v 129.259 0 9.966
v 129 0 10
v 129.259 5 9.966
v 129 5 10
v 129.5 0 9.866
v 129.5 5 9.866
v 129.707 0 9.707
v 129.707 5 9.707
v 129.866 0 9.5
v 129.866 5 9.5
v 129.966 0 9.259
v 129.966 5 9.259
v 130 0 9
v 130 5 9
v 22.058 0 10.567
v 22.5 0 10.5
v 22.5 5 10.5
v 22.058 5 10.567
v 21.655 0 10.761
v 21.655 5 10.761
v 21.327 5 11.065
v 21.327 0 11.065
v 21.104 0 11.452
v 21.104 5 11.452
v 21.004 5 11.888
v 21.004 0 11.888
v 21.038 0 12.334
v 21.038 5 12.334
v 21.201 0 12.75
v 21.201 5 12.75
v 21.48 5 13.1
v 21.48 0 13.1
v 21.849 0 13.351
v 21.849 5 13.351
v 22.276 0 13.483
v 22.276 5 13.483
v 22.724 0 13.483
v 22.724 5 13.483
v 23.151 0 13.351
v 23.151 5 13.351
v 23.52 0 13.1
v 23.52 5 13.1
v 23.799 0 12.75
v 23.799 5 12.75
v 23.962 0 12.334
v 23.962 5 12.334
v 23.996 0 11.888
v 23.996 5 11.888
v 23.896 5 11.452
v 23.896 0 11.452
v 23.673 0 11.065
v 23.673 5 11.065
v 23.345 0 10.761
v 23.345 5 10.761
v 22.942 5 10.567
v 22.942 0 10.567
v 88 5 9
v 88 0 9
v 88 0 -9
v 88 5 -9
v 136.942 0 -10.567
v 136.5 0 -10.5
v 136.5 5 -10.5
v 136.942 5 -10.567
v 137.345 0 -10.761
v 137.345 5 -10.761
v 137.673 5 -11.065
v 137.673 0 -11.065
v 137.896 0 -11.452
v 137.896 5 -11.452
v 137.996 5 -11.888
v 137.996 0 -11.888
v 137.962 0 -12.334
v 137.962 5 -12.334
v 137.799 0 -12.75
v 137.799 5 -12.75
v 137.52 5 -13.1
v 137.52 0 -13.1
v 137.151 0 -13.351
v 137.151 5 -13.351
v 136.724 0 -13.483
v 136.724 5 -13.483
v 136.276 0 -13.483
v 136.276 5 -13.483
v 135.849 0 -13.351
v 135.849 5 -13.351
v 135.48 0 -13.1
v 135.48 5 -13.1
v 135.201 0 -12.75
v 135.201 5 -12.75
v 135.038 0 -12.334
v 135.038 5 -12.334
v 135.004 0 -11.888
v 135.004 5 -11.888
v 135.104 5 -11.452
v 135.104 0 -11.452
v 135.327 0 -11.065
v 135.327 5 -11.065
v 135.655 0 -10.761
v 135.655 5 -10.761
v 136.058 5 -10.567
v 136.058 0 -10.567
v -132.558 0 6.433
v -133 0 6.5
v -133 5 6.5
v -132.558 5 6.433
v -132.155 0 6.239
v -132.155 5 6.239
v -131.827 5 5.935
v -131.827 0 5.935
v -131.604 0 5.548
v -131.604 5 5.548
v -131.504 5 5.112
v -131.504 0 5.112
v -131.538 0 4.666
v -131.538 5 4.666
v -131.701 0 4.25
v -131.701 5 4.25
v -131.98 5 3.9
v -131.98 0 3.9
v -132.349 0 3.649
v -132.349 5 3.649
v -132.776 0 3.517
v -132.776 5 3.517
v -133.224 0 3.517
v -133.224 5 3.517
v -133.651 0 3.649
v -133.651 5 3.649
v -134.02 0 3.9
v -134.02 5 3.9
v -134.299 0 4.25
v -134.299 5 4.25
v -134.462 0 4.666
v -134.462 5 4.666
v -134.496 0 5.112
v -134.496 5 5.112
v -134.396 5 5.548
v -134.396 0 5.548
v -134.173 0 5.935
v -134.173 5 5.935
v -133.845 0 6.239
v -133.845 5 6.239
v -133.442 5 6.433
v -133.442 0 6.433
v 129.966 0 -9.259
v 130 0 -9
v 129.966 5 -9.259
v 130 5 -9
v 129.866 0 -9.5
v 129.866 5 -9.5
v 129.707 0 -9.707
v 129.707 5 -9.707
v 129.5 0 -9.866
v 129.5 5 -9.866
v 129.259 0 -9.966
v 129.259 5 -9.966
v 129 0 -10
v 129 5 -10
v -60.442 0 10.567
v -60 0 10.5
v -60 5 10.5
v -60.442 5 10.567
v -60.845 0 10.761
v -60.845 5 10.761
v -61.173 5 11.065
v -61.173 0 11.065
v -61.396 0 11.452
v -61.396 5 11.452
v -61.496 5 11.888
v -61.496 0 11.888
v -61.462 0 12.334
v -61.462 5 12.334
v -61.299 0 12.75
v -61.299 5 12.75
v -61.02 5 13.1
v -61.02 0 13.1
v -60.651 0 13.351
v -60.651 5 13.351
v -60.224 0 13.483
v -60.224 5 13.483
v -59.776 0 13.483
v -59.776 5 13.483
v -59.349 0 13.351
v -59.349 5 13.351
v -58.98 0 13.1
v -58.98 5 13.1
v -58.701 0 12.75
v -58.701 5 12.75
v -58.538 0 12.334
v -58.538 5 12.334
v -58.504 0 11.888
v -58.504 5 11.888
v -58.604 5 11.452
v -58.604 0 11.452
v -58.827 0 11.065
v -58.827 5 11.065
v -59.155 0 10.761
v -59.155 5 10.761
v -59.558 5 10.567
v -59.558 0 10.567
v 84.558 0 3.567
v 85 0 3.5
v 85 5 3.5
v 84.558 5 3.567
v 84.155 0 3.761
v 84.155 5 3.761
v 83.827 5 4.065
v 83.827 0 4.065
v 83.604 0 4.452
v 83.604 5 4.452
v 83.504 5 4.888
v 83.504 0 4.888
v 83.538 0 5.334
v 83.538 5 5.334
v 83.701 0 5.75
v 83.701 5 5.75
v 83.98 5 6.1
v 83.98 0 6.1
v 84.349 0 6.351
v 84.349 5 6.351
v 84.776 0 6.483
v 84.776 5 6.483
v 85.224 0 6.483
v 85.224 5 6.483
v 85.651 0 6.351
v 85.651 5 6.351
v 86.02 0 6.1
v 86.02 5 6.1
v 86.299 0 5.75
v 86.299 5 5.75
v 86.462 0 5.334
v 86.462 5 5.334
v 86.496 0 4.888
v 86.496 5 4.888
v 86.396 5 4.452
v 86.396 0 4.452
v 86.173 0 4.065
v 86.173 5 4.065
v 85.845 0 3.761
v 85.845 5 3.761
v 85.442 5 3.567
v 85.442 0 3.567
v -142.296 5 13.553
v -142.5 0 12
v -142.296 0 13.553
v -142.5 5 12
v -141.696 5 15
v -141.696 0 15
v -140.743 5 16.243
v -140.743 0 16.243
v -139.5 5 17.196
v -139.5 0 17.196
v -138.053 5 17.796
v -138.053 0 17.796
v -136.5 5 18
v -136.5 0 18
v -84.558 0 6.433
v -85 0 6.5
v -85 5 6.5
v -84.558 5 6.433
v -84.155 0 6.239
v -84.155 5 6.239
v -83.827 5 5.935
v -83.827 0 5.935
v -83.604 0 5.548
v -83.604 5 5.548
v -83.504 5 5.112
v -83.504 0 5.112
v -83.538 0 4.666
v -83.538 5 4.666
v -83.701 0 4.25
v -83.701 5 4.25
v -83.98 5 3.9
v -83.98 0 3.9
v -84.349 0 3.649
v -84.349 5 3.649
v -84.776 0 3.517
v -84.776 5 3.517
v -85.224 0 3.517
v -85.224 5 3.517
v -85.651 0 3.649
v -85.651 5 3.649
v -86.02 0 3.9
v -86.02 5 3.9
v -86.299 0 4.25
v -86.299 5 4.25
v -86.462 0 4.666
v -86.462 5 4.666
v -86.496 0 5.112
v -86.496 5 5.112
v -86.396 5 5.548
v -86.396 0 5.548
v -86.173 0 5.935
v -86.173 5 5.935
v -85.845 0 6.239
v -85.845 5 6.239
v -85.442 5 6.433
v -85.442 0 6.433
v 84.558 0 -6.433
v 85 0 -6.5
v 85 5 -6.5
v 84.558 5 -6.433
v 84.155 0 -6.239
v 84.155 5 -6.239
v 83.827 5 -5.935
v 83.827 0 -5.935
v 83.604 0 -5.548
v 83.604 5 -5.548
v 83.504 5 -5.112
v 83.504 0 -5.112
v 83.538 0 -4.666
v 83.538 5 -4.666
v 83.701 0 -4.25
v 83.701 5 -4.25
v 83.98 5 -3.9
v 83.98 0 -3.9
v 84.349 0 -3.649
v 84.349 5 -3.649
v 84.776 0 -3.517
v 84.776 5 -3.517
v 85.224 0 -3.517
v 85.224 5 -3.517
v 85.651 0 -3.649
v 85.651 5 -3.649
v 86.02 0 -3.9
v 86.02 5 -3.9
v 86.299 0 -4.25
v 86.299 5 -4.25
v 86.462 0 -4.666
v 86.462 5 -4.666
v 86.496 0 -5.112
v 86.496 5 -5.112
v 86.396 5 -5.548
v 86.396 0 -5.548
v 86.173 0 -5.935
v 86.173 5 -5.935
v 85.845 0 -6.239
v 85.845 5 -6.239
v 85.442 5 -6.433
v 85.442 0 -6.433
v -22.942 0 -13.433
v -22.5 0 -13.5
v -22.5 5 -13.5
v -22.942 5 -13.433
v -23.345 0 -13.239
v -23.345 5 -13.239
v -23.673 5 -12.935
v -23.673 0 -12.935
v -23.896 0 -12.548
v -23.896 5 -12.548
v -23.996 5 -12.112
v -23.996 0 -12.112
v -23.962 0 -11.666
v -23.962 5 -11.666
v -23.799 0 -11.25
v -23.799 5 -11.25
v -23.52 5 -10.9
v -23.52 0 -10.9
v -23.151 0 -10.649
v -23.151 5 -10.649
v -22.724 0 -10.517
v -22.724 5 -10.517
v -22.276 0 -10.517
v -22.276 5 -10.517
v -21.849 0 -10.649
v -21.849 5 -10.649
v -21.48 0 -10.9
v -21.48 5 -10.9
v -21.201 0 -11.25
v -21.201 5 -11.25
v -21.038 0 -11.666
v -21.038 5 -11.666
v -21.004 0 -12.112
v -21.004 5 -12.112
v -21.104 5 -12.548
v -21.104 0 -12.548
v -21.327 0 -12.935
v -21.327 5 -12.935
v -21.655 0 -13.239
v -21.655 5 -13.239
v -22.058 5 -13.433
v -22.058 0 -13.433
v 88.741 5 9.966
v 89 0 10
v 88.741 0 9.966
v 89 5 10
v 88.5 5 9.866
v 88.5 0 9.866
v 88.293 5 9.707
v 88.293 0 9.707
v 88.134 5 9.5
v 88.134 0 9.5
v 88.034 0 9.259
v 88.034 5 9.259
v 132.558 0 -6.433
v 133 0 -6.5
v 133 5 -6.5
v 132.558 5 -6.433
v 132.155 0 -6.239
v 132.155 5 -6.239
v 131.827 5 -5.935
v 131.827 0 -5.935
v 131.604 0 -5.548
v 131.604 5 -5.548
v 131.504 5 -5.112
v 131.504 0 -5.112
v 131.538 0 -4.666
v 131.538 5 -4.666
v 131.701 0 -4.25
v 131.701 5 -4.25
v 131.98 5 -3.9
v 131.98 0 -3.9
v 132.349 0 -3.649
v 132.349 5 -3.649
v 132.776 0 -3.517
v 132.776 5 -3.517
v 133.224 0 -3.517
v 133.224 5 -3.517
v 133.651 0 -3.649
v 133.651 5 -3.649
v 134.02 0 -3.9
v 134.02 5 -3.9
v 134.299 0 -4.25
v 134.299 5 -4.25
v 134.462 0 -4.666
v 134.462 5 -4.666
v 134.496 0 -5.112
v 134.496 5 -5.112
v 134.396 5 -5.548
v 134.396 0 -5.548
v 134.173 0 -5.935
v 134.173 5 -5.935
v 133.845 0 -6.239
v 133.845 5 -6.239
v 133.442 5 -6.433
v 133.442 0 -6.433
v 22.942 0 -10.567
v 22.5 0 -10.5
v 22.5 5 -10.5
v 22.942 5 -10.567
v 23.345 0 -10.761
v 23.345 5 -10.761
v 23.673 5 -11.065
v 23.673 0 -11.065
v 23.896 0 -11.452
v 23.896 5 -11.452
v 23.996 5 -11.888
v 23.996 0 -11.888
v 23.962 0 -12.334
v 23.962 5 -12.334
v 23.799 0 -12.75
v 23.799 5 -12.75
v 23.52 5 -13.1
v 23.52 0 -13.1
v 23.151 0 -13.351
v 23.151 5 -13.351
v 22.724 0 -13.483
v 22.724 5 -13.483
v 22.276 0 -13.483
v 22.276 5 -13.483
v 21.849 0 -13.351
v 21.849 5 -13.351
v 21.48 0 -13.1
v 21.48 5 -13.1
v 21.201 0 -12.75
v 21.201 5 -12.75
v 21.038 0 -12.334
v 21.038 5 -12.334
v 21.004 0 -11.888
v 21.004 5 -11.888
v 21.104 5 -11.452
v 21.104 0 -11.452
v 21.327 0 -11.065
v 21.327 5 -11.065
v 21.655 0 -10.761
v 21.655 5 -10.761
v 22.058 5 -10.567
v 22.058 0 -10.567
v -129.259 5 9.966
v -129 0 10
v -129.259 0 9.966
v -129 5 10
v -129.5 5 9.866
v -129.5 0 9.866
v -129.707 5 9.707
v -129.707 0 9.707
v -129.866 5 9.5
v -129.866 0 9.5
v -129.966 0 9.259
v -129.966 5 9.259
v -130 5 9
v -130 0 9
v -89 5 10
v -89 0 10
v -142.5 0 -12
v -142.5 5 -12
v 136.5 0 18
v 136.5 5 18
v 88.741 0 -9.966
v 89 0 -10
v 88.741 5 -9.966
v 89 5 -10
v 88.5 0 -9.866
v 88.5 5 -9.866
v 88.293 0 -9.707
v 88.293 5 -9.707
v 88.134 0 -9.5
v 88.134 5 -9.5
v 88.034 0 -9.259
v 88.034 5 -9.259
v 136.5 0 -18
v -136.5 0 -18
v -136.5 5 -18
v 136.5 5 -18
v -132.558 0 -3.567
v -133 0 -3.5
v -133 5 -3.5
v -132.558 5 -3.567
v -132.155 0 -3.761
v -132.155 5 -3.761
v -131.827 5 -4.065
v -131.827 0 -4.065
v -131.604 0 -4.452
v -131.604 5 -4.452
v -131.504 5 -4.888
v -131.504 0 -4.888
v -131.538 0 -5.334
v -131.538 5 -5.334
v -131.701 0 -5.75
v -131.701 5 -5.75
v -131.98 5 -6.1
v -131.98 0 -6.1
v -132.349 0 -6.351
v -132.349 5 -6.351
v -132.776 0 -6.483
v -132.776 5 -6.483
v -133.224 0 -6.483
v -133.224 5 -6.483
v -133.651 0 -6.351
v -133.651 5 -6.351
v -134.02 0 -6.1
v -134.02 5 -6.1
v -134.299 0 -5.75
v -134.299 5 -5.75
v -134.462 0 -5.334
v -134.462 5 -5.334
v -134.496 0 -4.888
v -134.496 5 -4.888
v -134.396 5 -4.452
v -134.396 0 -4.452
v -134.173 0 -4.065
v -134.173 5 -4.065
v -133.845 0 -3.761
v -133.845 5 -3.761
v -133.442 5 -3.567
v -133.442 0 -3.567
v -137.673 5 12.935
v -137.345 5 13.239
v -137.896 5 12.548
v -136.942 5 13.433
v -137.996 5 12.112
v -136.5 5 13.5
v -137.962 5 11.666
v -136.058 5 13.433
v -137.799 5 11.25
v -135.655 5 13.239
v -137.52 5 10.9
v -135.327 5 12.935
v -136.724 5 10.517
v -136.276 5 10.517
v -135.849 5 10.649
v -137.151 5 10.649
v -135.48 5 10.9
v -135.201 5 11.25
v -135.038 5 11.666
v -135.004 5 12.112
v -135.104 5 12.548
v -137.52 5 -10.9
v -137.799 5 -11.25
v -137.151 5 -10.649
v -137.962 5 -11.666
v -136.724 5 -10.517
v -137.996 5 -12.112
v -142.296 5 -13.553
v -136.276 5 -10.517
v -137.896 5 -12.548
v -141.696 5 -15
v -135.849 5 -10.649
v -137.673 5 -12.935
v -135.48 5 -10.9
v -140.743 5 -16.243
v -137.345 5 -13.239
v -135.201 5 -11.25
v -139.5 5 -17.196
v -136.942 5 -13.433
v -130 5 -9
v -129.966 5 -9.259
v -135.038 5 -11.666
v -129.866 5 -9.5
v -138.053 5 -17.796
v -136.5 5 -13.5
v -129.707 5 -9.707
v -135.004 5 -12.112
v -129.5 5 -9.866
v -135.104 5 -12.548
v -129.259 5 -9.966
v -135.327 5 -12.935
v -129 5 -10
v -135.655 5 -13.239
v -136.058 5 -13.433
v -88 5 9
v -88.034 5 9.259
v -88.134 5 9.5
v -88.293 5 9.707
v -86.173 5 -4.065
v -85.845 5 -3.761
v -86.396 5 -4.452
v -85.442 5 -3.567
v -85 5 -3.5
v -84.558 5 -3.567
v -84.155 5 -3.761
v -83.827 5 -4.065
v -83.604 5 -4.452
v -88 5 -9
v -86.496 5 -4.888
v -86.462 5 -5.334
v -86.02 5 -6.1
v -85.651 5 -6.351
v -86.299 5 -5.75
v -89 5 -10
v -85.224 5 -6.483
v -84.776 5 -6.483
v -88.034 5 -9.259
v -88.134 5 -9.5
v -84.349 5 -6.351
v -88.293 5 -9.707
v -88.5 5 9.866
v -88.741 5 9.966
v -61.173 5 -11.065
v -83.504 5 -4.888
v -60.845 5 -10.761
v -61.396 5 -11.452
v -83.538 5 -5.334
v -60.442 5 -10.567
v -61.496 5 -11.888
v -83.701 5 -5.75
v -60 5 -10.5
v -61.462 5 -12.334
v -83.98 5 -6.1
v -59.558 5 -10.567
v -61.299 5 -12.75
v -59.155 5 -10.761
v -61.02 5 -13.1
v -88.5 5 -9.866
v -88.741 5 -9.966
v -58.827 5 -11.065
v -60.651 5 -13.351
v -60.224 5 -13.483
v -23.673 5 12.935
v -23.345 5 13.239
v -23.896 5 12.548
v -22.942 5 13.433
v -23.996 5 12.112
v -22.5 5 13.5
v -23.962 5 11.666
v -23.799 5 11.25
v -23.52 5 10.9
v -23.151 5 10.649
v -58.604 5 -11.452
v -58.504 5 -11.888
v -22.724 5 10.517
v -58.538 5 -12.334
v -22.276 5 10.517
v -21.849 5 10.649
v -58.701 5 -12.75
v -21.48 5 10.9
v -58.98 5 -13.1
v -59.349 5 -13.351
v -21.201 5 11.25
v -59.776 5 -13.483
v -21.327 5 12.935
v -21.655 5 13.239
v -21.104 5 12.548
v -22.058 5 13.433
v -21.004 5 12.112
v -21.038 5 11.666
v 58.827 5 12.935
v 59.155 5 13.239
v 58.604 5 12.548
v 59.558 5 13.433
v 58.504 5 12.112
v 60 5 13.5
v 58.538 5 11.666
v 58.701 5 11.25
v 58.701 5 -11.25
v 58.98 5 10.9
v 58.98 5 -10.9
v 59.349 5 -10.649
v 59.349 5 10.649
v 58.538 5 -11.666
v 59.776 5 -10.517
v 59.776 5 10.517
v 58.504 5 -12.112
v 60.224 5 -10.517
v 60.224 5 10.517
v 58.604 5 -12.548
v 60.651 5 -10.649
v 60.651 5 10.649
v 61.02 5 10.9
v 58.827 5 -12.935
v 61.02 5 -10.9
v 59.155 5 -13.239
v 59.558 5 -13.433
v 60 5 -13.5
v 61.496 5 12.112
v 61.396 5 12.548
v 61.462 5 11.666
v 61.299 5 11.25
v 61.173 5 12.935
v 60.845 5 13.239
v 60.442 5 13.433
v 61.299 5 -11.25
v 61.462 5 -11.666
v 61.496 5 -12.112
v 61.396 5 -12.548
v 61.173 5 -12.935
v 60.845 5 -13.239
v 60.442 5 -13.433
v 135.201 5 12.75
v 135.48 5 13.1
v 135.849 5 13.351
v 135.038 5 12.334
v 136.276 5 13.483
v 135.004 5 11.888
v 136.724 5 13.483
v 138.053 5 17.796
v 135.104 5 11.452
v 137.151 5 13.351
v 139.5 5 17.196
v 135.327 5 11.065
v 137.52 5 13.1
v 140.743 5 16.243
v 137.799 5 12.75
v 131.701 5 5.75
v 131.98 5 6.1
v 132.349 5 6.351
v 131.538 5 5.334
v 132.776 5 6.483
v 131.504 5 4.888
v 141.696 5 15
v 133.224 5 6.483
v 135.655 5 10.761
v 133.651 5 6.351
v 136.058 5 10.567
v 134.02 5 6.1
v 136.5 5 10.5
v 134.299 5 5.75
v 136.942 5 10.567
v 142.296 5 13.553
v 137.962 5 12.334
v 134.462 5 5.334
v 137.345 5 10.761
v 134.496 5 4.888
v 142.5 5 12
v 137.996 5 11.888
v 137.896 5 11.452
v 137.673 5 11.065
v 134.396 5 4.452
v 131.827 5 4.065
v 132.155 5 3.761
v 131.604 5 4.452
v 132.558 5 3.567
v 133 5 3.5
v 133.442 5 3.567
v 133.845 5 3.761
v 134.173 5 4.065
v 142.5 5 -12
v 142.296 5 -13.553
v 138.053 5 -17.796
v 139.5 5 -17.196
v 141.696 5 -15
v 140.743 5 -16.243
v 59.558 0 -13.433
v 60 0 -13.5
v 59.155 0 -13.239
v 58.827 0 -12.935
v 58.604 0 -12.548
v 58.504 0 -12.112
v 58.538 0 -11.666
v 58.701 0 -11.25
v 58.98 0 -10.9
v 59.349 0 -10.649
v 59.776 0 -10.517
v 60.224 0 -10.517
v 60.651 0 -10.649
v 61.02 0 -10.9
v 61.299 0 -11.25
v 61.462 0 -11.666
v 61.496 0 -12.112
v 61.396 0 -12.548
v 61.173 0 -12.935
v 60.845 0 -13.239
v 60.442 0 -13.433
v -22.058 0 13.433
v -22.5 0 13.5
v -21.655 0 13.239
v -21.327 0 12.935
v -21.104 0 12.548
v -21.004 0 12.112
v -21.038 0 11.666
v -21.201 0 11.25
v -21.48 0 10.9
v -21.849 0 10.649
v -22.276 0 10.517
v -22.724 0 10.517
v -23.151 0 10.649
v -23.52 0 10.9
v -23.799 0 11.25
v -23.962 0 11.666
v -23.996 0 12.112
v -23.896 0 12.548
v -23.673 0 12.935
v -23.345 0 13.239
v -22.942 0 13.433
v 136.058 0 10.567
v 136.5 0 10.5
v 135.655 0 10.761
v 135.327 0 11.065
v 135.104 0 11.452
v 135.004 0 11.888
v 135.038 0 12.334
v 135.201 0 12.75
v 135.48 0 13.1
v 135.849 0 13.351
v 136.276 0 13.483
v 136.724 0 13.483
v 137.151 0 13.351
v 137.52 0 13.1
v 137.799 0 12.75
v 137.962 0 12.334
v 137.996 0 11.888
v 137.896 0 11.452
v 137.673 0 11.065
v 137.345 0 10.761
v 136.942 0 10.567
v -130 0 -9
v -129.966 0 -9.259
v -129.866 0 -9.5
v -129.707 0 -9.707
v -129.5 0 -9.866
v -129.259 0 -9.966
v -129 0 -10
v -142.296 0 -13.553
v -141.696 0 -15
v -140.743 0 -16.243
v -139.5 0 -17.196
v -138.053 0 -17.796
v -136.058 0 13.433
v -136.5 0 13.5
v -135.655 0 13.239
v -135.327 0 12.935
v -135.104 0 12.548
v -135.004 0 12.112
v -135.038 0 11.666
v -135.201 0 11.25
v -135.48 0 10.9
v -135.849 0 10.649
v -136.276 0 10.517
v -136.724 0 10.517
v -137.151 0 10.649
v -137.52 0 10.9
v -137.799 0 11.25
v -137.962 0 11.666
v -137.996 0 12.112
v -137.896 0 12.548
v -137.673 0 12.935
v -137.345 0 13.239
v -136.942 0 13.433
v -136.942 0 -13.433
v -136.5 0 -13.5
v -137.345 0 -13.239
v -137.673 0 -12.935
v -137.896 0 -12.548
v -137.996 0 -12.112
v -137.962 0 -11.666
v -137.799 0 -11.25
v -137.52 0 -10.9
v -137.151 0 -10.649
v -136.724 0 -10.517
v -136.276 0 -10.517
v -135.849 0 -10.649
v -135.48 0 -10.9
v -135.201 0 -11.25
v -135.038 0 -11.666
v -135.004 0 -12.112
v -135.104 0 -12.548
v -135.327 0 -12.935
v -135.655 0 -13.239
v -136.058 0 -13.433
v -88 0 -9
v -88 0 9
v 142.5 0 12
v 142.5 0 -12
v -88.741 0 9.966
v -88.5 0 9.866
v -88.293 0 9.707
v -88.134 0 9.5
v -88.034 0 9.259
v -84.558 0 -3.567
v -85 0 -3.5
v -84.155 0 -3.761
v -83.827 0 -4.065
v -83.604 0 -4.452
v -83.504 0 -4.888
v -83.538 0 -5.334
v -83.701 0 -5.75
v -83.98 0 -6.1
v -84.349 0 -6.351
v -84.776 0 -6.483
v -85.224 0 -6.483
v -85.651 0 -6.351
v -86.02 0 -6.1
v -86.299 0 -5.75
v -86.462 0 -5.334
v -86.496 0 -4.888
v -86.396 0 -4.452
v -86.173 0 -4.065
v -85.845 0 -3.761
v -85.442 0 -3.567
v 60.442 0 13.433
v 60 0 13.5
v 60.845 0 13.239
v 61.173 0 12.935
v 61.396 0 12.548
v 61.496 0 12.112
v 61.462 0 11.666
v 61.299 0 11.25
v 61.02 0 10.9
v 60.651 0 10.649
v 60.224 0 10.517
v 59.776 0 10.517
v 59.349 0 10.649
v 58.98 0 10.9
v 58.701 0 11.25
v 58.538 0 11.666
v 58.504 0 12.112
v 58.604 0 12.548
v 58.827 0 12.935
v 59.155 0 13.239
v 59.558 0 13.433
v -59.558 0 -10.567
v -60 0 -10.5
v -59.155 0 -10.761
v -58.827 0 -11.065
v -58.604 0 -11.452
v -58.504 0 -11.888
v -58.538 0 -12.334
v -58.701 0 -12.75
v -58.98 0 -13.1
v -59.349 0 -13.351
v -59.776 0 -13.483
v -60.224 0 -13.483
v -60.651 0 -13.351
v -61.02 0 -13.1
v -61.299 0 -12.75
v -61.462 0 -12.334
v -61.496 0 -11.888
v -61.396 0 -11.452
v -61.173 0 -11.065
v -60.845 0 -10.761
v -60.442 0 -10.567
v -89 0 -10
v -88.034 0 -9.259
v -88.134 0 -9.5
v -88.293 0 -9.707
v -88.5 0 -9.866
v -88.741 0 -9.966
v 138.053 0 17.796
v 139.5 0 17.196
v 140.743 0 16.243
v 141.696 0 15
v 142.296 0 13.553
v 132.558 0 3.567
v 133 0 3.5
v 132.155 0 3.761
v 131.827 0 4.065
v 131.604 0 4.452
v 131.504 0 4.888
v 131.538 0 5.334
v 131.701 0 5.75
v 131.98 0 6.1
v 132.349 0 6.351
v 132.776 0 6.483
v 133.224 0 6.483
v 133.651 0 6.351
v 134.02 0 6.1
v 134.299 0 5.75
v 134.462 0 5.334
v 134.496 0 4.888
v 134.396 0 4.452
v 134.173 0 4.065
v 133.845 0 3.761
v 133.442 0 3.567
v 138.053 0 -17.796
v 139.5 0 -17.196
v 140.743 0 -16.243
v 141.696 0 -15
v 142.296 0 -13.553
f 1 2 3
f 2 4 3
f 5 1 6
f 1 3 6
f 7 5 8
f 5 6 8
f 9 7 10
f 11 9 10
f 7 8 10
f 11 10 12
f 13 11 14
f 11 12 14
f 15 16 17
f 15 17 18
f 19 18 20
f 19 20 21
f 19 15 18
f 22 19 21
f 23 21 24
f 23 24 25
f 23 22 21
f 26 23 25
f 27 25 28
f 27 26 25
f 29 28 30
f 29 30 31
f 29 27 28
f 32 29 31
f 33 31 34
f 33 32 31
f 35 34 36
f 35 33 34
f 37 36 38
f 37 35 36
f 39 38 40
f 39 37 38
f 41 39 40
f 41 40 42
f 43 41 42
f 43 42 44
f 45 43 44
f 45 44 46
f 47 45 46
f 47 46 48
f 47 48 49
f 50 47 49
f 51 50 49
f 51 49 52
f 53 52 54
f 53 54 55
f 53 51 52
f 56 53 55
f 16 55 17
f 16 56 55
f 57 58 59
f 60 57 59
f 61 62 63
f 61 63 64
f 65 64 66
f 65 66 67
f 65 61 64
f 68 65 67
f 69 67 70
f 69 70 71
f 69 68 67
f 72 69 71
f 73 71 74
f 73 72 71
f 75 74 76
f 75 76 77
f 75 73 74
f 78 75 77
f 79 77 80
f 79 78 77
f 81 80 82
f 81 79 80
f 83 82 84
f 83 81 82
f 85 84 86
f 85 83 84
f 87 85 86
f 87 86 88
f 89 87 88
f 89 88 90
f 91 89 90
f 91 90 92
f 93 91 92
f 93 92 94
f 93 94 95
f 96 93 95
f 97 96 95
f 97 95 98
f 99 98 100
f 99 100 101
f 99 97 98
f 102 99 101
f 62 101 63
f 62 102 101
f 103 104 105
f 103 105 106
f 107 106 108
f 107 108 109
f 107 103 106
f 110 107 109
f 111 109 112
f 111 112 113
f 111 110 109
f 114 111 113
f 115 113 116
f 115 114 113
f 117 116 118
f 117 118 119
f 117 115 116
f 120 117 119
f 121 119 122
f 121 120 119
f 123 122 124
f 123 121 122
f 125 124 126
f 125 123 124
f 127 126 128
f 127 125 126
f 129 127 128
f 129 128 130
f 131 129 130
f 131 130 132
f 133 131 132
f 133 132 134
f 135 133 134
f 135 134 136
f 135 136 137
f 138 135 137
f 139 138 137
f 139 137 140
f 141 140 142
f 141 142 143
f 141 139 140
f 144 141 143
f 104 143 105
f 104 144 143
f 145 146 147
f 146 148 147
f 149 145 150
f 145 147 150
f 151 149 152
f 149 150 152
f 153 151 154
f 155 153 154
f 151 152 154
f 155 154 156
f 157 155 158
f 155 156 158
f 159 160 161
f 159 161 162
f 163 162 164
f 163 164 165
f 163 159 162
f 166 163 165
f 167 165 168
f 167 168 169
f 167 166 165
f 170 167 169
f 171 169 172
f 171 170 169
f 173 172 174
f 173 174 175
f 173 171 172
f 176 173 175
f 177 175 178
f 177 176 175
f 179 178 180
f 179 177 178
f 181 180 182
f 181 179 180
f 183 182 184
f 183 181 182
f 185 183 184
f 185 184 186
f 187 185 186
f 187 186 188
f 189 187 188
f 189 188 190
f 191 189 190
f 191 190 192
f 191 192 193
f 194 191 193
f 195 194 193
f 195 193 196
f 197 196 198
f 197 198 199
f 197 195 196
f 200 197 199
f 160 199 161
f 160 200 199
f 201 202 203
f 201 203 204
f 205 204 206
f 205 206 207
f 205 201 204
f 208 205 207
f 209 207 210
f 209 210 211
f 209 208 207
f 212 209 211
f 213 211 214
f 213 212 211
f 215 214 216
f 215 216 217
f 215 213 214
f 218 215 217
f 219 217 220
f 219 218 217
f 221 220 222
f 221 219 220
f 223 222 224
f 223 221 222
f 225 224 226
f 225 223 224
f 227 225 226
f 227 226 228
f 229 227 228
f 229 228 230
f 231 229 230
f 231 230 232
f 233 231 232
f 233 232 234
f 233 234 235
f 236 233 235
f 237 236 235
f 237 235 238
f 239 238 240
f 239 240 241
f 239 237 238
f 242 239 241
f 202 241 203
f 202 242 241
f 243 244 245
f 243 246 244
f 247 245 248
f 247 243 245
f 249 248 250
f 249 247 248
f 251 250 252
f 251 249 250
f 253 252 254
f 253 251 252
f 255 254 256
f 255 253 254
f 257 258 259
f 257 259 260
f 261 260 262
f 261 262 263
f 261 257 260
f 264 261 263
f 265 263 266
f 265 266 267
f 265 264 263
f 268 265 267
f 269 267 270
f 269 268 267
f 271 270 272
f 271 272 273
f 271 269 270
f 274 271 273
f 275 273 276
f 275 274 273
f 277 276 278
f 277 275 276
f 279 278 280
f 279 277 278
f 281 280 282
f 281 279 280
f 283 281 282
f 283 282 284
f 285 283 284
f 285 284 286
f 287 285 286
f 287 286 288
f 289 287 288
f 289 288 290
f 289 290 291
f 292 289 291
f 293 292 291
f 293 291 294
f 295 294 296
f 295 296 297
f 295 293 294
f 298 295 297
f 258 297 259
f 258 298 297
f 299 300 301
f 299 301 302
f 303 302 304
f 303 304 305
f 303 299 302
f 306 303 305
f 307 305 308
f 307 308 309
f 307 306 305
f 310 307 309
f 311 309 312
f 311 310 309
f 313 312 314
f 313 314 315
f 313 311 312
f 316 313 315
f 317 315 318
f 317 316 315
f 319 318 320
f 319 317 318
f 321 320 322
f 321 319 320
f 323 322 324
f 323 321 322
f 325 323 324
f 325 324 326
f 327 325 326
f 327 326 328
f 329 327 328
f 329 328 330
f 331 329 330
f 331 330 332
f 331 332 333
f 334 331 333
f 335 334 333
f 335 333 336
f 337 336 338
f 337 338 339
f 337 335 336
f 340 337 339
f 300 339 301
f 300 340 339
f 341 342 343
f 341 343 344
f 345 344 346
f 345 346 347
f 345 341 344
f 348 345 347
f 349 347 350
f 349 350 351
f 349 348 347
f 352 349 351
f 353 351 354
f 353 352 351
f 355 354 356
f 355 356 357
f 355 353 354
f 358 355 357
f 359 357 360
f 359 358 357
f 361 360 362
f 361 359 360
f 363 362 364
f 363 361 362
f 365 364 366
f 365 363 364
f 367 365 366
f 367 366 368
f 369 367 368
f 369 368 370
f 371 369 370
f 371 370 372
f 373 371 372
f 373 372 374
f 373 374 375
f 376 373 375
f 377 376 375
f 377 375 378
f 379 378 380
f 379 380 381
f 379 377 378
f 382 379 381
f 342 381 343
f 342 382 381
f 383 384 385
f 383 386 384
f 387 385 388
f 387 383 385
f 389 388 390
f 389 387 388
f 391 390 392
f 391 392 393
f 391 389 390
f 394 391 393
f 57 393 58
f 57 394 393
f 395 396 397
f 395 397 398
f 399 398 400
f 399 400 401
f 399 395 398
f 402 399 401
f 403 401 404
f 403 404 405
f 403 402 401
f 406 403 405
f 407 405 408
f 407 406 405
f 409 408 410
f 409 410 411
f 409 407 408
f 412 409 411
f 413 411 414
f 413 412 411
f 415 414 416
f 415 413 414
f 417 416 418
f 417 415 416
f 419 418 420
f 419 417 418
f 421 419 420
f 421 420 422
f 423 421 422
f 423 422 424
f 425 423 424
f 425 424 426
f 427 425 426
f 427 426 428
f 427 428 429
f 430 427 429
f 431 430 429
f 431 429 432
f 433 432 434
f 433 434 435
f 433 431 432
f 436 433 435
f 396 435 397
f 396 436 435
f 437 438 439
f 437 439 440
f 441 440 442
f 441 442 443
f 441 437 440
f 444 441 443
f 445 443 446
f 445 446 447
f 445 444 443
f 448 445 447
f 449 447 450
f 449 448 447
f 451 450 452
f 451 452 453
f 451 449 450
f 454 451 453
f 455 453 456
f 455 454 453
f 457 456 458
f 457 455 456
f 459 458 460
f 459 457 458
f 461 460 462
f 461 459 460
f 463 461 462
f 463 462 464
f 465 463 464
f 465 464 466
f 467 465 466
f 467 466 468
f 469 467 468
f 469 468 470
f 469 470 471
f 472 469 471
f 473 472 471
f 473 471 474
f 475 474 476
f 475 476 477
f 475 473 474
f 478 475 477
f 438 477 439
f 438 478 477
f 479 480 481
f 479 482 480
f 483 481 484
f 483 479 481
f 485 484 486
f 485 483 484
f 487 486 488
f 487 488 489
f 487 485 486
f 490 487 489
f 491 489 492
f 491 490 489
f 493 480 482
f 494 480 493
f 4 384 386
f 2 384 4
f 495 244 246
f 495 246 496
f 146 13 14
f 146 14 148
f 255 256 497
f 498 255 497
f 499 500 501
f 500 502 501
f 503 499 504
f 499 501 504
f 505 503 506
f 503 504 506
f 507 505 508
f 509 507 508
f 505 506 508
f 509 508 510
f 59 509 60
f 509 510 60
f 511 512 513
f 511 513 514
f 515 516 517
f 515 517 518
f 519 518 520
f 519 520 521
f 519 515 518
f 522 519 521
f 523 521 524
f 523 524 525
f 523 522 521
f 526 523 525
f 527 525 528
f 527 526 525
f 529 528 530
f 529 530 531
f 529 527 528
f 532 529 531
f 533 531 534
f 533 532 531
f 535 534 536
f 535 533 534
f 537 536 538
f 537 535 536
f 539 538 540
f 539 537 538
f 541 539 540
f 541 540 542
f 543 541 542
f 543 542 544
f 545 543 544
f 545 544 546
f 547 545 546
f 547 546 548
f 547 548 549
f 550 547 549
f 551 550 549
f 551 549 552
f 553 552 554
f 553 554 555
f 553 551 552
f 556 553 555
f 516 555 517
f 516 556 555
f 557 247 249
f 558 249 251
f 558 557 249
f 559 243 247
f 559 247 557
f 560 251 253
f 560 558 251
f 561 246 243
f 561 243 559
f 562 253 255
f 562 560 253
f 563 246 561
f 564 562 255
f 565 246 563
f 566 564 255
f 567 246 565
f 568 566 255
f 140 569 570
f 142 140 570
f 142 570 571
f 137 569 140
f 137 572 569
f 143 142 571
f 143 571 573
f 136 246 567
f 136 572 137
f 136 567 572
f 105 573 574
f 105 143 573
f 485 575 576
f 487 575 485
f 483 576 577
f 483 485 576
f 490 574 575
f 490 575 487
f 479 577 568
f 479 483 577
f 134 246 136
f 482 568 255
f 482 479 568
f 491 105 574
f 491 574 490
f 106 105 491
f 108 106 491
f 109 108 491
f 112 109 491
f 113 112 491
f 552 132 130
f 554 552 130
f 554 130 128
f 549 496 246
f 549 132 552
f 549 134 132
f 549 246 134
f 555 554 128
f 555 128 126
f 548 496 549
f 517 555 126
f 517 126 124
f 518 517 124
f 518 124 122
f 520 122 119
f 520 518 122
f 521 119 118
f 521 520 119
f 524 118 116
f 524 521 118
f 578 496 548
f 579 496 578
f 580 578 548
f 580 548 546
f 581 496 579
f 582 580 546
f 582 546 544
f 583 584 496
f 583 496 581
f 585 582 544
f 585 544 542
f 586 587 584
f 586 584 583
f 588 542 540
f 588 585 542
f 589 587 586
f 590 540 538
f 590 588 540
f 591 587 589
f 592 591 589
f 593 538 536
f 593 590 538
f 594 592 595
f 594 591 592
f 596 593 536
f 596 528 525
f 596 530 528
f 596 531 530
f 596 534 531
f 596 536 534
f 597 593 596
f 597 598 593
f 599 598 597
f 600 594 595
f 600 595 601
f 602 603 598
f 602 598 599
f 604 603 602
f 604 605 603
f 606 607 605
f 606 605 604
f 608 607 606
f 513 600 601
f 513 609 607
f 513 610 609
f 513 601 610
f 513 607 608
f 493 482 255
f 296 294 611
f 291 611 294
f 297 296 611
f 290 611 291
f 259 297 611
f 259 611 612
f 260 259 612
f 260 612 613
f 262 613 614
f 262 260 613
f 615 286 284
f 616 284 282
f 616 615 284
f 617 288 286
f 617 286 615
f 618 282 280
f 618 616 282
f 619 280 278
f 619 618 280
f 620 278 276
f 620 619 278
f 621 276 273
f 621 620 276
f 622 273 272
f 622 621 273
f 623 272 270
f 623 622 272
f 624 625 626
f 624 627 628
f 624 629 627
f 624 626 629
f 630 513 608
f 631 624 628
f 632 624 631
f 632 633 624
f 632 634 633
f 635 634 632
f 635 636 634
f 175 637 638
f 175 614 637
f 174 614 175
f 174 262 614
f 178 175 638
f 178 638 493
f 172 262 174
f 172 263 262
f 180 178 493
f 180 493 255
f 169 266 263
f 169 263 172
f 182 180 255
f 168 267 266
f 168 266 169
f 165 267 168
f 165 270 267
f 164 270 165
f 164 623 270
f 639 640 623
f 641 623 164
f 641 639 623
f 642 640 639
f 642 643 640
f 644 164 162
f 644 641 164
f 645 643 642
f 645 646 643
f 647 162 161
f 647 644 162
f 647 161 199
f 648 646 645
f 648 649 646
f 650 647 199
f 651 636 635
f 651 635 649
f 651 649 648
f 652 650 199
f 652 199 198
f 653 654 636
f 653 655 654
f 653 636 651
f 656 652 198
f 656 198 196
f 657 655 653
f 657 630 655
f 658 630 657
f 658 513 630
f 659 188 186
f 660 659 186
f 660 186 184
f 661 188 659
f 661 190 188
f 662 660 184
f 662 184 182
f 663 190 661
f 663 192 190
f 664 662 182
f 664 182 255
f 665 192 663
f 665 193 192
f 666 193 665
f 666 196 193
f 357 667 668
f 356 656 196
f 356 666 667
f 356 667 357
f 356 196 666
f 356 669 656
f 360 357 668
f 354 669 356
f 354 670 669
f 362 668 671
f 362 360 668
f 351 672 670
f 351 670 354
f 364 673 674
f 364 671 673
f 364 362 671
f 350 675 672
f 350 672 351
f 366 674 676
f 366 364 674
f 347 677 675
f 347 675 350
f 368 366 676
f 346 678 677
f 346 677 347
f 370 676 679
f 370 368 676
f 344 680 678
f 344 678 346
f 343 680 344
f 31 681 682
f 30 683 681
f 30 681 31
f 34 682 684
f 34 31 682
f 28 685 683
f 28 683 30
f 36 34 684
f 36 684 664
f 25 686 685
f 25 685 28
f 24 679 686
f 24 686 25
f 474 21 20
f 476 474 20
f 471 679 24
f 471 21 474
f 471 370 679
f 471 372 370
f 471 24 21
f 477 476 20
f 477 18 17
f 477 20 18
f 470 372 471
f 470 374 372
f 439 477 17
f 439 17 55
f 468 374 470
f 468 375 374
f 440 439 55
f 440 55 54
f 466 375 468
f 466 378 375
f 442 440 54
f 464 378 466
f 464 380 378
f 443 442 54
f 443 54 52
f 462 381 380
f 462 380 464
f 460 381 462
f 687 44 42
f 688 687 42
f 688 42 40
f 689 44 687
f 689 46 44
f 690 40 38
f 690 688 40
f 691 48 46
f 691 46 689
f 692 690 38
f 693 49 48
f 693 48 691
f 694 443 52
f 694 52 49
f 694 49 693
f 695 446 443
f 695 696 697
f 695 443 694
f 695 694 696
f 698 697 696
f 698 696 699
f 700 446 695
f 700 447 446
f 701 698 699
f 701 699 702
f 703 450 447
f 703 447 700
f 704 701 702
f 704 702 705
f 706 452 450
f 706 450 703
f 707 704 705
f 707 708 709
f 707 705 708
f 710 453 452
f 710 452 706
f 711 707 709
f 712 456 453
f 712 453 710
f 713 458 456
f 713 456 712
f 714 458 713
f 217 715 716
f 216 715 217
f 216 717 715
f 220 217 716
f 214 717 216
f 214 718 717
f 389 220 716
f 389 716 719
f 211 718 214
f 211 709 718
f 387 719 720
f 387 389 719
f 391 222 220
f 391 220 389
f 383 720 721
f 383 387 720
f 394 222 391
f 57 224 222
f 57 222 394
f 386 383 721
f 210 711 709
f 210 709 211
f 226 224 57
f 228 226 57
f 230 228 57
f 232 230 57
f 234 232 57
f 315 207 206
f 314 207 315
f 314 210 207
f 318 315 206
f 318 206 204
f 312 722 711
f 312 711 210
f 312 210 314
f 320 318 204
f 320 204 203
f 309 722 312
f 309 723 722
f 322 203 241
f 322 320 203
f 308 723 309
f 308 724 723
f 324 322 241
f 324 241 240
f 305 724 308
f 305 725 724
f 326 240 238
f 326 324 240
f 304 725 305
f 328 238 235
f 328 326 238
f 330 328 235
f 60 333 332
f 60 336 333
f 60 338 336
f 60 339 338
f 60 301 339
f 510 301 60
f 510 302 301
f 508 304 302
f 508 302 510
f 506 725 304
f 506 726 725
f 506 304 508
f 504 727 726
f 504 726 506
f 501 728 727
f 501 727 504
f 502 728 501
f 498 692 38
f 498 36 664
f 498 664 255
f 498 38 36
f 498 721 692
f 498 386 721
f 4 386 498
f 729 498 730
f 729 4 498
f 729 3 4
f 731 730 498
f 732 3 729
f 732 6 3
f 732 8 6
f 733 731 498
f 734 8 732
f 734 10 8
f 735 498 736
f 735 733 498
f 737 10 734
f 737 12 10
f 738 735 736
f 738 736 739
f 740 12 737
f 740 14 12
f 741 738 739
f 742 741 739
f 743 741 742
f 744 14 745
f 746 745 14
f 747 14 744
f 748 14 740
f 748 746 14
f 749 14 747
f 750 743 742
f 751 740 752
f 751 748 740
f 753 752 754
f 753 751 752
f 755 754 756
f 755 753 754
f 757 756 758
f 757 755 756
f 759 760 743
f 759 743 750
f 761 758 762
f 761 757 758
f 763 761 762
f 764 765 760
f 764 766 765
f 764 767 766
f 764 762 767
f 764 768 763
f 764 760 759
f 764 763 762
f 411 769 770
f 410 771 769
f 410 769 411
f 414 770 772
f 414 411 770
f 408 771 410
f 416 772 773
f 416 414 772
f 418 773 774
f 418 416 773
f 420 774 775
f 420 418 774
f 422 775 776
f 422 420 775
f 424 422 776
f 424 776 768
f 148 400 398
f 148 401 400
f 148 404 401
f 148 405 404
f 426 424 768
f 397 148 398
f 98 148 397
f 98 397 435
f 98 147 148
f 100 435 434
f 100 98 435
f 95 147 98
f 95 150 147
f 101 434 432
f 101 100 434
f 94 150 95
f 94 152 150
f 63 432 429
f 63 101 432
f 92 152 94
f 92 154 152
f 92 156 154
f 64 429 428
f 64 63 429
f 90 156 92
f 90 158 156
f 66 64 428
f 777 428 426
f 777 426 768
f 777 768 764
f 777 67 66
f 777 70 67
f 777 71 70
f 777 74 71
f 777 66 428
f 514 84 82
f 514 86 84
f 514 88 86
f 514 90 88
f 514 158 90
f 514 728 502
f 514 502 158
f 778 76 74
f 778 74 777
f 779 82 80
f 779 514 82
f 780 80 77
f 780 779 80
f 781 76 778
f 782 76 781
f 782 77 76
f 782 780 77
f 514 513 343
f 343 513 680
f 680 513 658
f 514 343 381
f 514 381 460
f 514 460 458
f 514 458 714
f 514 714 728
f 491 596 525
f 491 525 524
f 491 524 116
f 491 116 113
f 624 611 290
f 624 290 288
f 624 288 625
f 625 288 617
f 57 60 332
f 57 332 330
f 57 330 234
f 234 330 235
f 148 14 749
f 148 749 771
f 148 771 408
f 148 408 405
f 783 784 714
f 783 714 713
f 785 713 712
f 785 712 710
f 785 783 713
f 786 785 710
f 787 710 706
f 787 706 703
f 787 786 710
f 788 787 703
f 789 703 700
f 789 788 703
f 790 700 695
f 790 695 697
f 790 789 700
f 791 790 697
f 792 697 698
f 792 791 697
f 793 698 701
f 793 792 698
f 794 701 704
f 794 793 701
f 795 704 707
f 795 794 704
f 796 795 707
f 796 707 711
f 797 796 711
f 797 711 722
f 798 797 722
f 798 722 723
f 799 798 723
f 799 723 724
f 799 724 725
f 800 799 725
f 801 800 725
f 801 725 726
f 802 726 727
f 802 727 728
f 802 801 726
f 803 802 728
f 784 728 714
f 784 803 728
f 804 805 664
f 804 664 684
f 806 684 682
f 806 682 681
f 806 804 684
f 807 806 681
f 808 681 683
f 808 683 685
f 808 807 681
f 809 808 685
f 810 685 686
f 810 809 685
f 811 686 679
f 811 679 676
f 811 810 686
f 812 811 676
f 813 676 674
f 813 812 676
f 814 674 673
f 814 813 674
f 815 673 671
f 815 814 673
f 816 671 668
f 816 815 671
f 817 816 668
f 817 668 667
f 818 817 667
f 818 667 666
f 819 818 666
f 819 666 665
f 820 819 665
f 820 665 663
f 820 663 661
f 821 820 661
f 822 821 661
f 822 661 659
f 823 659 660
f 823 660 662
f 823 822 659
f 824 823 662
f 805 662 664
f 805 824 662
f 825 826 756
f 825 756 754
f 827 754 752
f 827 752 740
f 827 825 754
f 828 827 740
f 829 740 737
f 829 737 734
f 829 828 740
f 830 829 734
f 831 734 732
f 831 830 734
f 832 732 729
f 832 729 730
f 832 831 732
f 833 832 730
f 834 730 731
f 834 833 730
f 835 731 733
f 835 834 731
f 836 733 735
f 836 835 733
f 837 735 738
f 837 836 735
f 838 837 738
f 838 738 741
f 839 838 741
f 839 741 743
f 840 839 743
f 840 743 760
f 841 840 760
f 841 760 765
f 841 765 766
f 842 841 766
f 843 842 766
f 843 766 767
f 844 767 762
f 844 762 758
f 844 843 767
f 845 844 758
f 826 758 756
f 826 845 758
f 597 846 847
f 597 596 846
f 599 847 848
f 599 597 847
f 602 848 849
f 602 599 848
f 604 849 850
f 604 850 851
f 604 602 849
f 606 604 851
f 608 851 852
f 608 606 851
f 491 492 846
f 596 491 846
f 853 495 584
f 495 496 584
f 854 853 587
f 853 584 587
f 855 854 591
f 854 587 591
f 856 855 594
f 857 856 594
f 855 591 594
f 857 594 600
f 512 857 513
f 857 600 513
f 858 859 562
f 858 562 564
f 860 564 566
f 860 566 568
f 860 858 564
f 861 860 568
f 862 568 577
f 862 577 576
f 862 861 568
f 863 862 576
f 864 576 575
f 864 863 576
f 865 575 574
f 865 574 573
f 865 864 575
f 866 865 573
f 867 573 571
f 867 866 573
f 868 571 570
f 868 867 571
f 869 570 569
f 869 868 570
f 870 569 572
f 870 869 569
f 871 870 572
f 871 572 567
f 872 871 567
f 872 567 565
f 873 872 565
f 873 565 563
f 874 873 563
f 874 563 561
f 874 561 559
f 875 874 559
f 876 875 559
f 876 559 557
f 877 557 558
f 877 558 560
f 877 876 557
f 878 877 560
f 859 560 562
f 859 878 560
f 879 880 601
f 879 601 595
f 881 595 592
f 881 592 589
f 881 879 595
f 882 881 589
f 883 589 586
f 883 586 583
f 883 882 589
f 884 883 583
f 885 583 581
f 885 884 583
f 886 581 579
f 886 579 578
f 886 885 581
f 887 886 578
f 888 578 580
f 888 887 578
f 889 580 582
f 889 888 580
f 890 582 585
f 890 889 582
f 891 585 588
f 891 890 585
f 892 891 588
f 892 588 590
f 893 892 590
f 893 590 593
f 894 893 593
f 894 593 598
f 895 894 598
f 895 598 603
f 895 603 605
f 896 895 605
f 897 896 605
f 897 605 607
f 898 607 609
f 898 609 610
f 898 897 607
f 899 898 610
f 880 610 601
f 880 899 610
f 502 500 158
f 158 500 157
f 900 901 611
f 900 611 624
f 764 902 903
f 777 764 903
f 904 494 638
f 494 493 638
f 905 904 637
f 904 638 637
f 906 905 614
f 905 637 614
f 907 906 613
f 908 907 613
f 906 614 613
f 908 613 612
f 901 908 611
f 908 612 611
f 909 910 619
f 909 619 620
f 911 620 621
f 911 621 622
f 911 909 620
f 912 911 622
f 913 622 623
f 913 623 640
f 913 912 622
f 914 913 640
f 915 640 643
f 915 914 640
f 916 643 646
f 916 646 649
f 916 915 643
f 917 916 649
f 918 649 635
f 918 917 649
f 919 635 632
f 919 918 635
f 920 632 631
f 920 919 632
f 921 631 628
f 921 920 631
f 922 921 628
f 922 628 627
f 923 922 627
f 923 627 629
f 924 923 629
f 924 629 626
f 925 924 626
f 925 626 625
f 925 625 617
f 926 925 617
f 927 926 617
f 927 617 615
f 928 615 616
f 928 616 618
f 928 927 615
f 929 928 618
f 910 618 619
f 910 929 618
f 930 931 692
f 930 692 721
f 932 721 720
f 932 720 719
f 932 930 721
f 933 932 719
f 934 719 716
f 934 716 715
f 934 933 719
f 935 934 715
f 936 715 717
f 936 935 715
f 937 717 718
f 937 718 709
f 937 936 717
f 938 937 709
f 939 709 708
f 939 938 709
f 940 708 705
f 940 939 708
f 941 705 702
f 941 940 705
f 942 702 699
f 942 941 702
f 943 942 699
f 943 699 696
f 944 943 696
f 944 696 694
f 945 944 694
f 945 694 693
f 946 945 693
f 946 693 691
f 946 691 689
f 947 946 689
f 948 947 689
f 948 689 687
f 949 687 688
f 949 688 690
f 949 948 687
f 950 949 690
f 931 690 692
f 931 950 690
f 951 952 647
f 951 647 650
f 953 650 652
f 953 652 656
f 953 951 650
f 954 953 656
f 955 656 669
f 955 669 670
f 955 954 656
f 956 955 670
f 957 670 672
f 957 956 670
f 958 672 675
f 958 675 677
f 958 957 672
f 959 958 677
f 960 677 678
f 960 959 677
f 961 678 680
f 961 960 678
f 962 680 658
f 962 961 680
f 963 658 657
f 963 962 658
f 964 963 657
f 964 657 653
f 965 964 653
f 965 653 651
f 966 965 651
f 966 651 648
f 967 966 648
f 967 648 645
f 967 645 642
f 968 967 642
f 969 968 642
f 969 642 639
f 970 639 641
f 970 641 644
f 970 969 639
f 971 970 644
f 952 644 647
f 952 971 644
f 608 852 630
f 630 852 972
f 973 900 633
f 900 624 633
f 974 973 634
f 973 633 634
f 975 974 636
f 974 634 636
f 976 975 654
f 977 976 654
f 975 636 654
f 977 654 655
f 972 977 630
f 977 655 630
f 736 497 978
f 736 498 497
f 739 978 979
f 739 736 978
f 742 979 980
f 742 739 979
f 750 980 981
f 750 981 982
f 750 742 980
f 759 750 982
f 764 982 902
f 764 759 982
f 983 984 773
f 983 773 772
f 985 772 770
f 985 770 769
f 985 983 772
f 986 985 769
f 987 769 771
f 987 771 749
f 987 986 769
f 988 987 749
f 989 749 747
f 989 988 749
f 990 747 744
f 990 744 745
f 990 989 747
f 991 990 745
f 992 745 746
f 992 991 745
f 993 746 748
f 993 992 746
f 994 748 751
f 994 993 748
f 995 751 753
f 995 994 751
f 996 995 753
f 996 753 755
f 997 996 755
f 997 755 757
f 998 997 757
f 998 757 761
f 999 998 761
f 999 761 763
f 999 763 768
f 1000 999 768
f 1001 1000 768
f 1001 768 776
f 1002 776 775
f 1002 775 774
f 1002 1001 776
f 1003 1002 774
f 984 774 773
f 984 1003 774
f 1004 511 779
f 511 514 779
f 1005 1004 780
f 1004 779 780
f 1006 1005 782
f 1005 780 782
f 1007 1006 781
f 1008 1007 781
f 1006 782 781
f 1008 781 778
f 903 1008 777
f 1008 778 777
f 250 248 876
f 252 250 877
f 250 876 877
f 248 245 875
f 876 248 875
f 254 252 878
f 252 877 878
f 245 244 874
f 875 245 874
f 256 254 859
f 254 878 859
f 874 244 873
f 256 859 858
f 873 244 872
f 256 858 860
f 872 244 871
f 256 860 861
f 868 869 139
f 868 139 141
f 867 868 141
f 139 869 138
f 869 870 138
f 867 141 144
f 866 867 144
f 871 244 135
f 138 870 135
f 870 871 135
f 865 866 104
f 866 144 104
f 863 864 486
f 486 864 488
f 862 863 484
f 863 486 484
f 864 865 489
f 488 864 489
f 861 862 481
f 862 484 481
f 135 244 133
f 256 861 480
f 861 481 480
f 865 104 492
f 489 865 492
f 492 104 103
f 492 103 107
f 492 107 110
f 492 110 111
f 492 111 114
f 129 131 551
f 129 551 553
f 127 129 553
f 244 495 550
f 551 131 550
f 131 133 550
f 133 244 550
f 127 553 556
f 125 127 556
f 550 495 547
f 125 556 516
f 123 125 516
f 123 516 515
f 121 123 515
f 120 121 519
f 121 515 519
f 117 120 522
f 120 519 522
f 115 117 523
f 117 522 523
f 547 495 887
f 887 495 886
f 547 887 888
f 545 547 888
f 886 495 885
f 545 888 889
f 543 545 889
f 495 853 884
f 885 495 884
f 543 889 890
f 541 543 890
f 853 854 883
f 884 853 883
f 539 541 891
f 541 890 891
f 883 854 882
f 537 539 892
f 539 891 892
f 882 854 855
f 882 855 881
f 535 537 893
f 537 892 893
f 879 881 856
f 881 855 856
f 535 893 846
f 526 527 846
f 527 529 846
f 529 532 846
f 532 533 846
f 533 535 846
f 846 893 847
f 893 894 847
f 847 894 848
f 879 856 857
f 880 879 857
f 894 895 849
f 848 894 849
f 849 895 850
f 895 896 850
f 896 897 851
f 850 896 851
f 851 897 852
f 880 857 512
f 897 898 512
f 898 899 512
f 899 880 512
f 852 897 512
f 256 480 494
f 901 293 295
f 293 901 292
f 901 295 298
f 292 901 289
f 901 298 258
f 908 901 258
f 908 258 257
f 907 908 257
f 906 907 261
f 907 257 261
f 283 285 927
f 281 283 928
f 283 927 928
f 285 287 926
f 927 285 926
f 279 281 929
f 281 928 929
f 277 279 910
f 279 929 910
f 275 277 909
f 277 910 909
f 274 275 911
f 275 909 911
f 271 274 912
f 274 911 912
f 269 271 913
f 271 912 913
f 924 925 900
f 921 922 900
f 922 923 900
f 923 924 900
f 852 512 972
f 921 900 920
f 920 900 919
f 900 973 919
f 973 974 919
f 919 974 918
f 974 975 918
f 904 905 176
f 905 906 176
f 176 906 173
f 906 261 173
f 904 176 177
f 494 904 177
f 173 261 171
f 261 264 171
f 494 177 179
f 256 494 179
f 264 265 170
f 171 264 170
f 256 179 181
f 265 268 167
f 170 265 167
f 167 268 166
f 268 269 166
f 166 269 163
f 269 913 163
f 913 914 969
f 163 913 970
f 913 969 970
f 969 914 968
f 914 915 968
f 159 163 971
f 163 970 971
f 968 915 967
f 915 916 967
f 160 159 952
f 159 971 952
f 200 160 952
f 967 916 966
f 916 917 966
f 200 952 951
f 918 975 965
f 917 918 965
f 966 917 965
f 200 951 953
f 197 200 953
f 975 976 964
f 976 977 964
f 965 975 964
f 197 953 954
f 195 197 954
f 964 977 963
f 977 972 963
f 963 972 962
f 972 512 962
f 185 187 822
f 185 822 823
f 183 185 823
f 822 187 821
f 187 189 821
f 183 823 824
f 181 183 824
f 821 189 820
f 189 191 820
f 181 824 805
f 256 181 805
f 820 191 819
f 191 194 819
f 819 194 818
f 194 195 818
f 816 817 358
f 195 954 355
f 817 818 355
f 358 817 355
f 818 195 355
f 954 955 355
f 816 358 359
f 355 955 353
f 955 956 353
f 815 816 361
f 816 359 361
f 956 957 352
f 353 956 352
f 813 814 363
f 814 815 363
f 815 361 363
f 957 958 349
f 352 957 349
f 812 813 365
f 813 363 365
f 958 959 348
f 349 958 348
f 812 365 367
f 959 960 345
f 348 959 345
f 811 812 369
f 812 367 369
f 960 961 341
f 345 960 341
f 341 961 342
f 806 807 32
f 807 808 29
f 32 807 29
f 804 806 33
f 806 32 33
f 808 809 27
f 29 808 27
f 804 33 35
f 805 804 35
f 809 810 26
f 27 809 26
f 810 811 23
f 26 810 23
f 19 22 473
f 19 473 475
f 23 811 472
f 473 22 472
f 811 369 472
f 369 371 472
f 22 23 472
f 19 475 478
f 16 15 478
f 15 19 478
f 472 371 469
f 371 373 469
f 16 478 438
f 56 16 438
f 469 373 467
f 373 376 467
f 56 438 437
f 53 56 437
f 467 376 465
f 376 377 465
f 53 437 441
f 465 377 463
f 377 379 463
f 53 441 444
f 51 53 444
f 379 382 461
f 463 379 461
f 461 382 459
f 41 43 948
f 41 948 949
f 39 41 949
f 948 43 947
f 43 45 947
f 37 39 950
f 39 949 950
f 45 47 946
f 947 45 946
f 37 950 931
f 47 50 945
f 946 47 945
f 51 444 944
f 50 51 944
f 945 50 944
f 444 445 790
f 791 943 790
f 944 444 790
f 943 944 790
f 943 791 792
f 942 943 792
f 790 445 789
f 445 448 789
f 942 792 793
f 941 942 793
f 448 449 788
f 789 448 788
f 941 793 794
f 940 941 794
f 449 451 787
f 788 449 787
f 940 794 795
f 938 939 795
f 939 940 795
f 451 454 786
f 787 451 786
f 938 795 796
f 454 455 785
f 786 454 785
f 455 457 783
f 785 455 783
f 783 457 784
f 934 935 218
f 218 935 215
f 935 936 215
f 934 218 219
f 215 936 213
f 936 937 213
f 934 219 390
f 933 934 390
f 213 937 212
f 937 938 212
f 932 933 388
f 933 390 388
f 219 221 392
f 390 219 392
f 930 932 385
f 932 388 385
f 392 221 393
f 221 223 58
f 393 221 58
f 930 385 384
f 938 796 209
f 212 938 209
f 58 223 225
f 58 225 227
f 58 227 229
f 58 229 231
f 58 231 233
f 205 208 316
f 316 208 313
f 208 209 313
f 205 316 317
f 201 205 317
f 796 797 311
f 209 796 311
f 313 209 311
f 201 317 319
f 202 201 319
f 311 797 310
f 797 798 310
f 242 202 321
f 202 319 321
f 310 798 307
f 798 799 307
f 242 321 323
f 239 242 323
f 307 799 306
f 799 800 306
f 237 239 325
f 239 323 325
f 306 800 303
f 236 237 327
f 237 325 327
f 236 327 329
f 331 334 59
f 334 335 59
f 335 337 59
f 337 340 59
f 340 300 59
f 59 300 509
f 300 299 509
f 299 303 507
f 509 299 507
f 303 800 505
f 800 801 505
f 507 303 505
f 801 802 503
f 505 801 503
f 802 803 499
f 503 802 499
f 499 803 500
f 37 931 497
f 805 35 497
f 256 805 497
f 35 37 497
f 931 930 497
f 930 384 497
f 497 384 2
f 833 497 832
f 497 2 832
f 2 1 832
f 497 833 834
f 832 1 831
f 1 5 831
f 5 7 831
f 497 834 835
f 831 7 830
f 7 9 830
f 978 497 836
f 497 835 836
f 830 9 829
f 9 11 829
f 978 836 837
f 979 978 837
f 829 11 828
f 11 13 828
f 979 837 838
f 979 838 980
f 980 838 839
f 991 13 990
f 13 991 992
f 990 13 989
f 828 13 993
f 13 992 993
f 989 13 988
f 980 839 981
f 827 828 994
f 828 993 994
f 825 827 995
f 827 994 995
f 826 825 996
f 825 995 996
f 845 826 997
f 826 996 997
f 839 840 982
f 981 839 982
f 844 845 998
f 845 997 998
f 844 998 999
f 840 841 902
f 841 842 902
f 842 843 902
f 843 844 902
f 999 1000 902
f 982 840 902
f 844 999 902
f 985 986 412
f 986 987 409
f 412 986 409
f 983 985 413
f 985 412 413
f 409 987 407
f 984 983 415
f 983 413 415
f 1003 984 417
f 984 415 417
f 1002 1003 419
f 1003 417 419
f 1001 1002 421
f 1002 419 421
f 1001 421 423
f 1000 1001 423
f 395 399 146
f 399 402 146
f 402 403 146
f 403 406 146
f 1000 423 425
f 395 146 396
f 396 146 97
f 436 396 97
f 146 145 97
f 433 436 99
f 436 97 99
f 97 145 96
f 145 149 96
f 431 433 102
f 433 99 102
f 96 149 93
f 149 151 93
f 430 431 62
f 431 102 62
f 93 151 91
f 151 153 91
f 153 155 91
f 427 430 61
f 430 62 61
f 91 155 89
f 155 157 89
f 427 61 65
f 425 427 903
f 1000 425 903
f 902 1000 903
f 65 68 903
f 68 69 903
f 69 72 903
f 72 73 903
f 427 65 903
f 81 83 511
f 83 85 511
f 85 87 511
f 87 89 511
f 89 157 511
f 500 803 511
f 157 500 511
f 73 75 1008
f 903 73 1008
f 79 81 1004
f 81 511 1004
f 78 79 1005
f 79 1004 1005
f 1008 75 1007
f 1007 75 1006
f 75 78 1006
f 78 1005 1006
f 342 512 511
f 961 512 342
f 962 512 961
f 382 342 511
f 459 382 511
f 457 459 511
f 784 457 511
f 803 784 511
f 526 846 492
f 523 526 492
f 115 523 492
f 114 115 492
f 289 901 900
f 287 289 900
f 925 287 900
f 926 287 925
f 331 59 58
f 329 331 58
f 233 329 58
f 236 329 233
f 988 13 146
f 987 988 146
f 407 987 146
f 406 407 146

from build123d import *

# Parameters (mm, degrees)
SKETCH1_W           = 285
SKETCH1_H           = 36
SKETCH1_R           = 1.5
SKETCH1_W_2         = 42
SKETCH1_H_2         = 20
BOSS_EXTRUDE2_DEPTH = 5
FILLET1_R           = 6
FILLET2_R           = 1


with BuildPart() as part:
    # Sketch1 → Boss-Extrude2 (new body)
    with BuildSketch(Plane(origin=(0, 0, 0), x_dir=(1, 0, 0), z_dir=(0, 1, 0))):
        Rectangle(SKETCH1_W, SKETCH1_H)
        with Locations(Location((-85, -5, 0), (0, 0, 270))):
            Circle(SKETCH1_R, mode=Mode.SUBTRACT)
        with Locations(Location((-85, 5, 0), (0, 0, 270))):
            Circle(SKETCH1_R, mode=Mode.SUBTRACT)
        with Locations(Location((-133, 5, 0), (0, 0, 270))):
            Circle(SKETCH1_R, mode=Mode.SUBTRACT)
        with Locations(Location((-133, -5, 0), (0, 0, 270))):
            Circle(SKETCH1_R, mode=Mode.SUBTRACT)
        with Locations(Location((133, -5, 0), (0, 0, 90))):
            Circle(SKETCH1_R, mode=Mode.SUBTRACT)
        with Locations(Location((133, 5, 0), (0, 0, 90))):
            Circle(SKETCH1_R, mode=Mode.SUBTRACT)
        with Locations(Location((85, -5, 0), (0, 0, 90))):
            Circle(SKETCH1_R, mode=Mode.SUBTRACT)
        with Locations(Location((85, 5, 0), (0, 0, 90))):
            Circle(SKETCH1_R, mode=Mode.SUBTRACT)
        with Locations(Location((-22.5, -12, 0), (0, 0, 270))):
            Circle(SKETCH1_R, mode=Mode.SUBTRACT)
        with Locations(Location((-22.5, 12, 0), (0, 0, 90))):
            Circle(SKETCH1_R, mode=Mode.SUBTRACT)
        with Locations(Location((-136.5, -12, 0), (0, 0, 270))):
            Circle(SKETCH1_R, mode=Mode.SUBTRACT)
        with Locations(Location((-136.5, 12, 0), (0, 0, 90))):
            Circle(SKETCH1_R, mode=Mode.SUBTRACT)
        with Locations(Location((22.5, -12, 0), (0, 0, 90))):
            Circle(SKETCH1_R, mode=Mode.SUBTRACT)
        with Locations(Location((22.5, 12, 0), (0, 0, 270))):
            Circle(SKETCH1_R, mode=Mode.SUBTRACT)
        with Locations(Location((136.5, -12, 0), (0, 0, 90))):
            Circle(SKETCH1_R, mode=Mode.SUBTRACT)
        with Locations(Location((136.5, 12, 0), (0, 0, 270))):
            Circle(SKETCH1_R, mode=Mode.SUBTRACT)
        with Locations(Location((-60, 12, 0), (0, 0, 270))):
            Circle(SKETCH1_R, mode=Mode.SUBTRACT)
        with Locations(Location((-60, -12, 0), (0, 0, 90))):
            Circle(SKETCH1_R, mode=Mode.SUBTRACT)
        with Locations(Location((60, -12, 0), (0, 0, 270))):
            Circle(SKETCH1_R, mode=Mode.SUBTRACT)
        with Locations(Location((60, 12, 0), (0, 0, 90))):
            Circle(SKETCH1_R, mode=Mode.SUBTRACT)
        with Locations((-109, 0)):
            Rectangle(SKETCH1_W_2, SKETCH1_H_2, mode=Mode.SUBTRACT)
        with Locations((109, 0)):
            Rectangle(SKETCH1_W_2, SKETCH1_H_2, mode=Mode.SUBTRACT)
    extrude(amount=BOSS_EXTRUDE2_DEPTH)

    # Fillet1
    fillet1_edges = [part.edges().sort_by_distance(p)[0] for p in [
        (142.5, 2.5, 18),
        (-142.5, 2.5, 18),
        (-142.5, 2.5, -18),
        (142.5, 2.5, -18),
    ]]
    fillet(fillet1_edges, radius=FILLET1_R)

    # Fillet2
    fillet2_edges = [part.edges().sort_by_distance(p)[0] for p in [
        (-88, 2.5, 10),
        (-88, 2.5, -10),
        (-130, 2.5, -10),
        (-130, 2.5, 10),
        (130, 2.5, -10),
        (88, 2.5, -10),
        (88, 2.5, 10),
        (130, 2.5, 10),
    ]]
    fillet(fillet2_edges, radius=FILLET2_R)


solid = part.part
